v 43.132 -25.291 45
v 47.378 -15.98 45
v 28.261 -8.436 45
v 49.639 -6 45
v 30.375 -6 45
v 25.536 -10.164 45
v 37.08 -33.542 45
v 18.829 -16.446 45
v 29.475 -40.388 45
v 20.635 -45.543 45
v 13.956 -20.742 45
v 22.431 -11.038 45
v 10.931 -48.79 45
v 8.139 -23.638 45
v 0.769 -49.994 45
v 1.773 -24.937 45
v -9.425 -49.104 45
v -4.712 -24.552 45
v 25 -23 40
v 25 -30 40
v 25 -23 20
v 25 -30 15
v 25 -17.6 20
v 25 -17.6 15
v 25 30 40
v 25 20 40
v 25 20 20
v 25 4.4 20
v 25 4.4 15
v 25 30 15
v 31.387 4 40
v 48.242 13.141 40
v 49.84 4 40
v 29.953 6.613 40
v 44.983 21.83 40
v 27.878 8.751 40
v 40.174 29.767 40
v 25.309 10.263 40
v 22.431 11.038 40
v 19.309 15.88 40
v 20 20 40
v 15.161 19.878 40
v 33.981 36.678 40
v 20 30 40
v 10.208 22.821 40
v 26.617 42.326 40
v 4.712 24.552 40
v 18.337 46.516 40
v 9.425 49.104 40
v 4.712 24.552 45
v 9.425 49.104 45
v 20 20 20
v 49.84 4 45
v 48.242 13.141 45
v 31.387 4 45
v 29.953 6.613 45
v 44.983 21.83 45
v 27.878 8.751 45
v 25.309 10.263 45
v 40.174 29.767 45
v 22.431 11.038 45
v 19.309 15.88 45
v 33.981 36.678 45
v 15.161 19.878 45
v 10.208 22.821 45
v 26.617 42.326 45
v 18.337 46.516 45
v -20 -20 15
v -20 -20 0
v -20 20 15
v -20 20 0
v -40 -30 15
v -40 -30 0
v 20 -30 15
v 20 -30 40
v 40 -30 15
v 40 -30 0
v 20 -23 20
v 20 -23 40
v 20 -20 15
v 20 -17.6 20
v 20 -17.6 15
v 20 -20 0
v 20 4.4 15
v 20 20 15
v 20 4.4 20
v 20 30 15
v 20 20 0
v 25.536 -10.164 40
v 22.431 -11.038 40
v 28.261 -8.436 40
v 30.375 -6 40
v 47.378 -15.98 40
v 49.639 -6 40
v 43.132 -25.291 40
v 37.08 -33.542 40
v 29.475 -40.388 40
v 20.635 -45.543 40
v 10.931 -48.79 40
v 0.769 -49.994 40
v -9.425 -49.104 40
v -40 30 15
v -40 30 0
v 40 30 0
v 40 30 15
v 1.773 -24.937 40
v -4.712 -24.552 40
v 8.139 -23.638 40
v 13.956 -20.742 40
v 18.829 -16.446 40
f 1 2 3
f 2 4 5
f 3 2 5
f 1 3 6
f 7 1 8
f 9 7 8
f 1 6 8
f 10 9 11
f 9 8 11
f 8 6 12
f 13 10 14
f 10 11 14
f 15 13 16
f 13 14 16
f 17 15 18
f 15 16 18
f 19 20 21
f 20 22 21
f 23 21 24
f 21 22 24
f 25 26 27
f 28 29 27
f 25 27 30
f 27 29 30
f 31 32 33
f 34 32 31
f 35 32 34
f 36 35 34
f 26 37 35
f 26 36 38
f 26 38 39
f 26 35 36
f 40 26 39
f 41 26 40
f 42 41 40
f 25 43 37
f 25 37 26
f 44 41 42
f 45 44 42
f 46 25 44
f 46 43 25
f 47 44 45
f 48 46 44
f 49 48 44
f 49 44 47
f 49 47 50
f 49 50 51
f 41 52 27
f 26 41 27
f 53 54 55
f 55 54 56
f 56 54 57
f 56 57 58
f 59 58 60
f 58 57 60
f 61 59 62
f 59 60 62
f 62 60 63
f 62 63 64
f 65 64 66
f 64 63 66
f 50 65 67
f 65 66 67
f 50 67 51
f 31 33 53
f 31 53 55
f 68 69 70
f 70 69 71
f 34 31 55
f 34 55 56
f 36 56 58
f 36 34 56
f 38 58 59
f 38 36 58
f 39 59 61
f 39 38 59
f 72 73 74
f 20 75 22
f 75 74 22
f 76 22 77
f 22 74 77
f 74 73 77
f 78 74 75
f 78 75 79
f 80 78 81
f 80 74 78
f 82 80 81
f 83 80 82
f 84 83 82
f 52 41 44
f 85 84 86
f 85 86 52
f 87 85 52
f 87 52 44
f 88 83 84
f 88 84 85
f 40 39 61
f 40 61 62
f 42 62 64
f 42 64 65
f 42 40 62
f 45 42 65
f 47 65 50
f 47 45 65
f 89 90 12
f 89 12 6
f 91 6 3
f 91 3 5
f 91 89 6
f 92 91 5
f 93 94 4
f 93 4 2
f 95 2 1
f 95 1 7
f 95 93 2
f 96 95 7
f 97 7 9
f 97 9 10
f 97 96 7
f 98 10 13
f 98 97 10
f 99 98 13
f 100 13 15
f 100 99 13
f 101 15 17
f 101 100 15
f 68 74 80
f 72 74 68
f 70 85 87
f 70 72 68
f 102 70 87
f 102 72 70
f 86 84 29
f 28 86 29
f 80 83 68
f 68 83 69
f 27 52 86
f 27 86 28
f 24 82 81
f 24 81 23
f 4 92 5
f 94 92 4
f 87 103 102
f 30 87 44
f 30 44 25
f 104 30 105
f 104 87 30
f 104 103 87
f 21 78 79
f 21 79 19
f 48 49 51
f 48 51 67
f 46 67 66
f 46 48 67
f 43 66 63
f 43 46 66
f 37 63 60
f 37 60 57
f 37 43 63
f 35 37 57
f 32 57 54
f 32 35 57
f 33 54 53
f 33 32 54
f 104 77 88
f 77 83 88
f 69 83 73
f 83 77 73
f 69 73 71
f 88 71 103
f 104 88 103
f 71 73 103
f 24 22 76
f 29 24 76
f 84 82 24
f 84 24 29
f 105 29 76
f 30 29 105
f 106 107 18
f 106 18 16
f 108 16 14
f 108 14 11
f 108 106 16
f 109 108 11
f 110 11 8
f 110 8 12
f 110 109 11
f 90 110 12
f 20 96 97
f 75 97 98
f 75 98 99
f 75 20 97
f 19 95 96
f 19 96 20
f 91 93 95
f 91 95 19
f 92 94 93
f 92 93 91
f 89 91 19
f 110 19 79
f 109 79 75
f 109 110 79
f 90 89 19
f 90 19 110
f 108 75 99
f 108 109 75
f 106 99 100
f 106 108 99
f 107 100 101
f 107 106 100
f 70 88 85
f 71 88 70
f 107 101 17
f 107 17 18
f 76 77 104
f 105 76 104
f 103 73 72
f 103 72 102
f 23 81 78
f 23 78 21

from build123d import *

# Parameters (mm, degrees)
SKETCH2_W           = 60
SKETCH2_H           = 80
SKETCH2_W_2         = 40
SKETCH2_H_2         = 40
BOSS_EXTRUDE1_DEPTH = 15
SKETCH6_W           = 5
SKETCH6_H           = 25.6
SKETCH6_H_2         = 12.4
BOSS_EXTRUDE4_DEPTH = 5
SKETCH8_W           = 5
SKETCH8_H           = 7
BOSS_EXTRUDE5_DEPTH = 20
SKETCH9_W           = 5
SKETCH9_H           = 10
BOSS_EXTRUDE6_DEPTH = 20
BOSS_EXTRUDE7_DEPTH = 5


with BuildPart() as part:
    # Sketch2 → Boss-Extrude1 (new body)
    with BuildSketch(Plane(origin=(0, 0, 0), x_dir=(0, 1, 0), z_dir=(0, 0, 1))):
        Rectangle(SKETCH2_W, SKETCH2_H)
        Rectangle(SKETCH2_W_2, SKETCH2_H_2, mode=Mode.SUBTRACT)
    extrude(amount=BOSS_EXTRUDE1_DEPTH)

    # Sketch6 → Boss-Extrude4 (add)
    with BuildSketch(Plane.XY.offset(15)):
        with Locations((22.5, 17.2)):
            Rectangle(SKETCH6_W, SKETCH6_H)
        with Locations((22.5, -23.8)):
            Rectangle(SKETCH6_W, SKETCH6_H_2)
    extrude(amount=BOSS_EXTRUDE4_DEPTH)

    # Sketch8 → Boss-Extrude5 (add)
    with BuildSketch(Plane.XY.offset(20)):
        with Locations((22.5, -26.5)):
            Rectangle(SKETCH8_W, SKETCH8_H)
    extrude(amount=BOSS_EXTRUDE5_DEPTH)

    # Sketch9 → Boss-Extrude6 (add)
    with BuildSketch(Plane.XY.offset(20)):
        with Locations((22.5, 25)):
            Rectangle(SKETCH9_W, SKETCH9_H)
    extrude(amount=BOSS_EXTRUDE6_DEPTH)

    # Sketch10 → Boss-Extrude7 (add)
    with BuildSketch(Plane.XY.offset(40)):
        with BuildLine():
            Line((-9.424890685, -49.103680469), (-4.712445342, -24.551840234))
            ThreePointArc((-4.712445342, -24.551840234), (11.141961637, -22.379827767), (22.431197476, -11.038178282))
            ThreePointArc((22.431197476, -11.038178282), (26.961461335, -9.399504495), (30.374950987, -6))
            Line((30.374950987, -6), (49.638694584, -6))
            ThreePointArc((49.638694584, -6), (29.474893104, -40.388496834), (-9.424890685, -49.103680469))
        make_face()
        with BuildLine():
            Line((4.712445342, 24.551840234), (9.424890685, 49.103680469))
            ThreePointArc((9.424890685, 49.103680469), (37.23787997, 33.366754342), (49.839743178, 4))
            Line((49.839743178, 4), (31.386996968, 4))
            ThreePointArc((31.386996968, 4), (27.877602661, 8.751473456), (22.431197476, 11.038178282))
            ThreePointArc((22.431197476, 11.038178282), (15.160775086, 19.878402823), (4.712445342, 24.551840234))
        make_face()
    extrude(amount=BOSS_EXTRUDE7_DEPTH)


solid = part.part
